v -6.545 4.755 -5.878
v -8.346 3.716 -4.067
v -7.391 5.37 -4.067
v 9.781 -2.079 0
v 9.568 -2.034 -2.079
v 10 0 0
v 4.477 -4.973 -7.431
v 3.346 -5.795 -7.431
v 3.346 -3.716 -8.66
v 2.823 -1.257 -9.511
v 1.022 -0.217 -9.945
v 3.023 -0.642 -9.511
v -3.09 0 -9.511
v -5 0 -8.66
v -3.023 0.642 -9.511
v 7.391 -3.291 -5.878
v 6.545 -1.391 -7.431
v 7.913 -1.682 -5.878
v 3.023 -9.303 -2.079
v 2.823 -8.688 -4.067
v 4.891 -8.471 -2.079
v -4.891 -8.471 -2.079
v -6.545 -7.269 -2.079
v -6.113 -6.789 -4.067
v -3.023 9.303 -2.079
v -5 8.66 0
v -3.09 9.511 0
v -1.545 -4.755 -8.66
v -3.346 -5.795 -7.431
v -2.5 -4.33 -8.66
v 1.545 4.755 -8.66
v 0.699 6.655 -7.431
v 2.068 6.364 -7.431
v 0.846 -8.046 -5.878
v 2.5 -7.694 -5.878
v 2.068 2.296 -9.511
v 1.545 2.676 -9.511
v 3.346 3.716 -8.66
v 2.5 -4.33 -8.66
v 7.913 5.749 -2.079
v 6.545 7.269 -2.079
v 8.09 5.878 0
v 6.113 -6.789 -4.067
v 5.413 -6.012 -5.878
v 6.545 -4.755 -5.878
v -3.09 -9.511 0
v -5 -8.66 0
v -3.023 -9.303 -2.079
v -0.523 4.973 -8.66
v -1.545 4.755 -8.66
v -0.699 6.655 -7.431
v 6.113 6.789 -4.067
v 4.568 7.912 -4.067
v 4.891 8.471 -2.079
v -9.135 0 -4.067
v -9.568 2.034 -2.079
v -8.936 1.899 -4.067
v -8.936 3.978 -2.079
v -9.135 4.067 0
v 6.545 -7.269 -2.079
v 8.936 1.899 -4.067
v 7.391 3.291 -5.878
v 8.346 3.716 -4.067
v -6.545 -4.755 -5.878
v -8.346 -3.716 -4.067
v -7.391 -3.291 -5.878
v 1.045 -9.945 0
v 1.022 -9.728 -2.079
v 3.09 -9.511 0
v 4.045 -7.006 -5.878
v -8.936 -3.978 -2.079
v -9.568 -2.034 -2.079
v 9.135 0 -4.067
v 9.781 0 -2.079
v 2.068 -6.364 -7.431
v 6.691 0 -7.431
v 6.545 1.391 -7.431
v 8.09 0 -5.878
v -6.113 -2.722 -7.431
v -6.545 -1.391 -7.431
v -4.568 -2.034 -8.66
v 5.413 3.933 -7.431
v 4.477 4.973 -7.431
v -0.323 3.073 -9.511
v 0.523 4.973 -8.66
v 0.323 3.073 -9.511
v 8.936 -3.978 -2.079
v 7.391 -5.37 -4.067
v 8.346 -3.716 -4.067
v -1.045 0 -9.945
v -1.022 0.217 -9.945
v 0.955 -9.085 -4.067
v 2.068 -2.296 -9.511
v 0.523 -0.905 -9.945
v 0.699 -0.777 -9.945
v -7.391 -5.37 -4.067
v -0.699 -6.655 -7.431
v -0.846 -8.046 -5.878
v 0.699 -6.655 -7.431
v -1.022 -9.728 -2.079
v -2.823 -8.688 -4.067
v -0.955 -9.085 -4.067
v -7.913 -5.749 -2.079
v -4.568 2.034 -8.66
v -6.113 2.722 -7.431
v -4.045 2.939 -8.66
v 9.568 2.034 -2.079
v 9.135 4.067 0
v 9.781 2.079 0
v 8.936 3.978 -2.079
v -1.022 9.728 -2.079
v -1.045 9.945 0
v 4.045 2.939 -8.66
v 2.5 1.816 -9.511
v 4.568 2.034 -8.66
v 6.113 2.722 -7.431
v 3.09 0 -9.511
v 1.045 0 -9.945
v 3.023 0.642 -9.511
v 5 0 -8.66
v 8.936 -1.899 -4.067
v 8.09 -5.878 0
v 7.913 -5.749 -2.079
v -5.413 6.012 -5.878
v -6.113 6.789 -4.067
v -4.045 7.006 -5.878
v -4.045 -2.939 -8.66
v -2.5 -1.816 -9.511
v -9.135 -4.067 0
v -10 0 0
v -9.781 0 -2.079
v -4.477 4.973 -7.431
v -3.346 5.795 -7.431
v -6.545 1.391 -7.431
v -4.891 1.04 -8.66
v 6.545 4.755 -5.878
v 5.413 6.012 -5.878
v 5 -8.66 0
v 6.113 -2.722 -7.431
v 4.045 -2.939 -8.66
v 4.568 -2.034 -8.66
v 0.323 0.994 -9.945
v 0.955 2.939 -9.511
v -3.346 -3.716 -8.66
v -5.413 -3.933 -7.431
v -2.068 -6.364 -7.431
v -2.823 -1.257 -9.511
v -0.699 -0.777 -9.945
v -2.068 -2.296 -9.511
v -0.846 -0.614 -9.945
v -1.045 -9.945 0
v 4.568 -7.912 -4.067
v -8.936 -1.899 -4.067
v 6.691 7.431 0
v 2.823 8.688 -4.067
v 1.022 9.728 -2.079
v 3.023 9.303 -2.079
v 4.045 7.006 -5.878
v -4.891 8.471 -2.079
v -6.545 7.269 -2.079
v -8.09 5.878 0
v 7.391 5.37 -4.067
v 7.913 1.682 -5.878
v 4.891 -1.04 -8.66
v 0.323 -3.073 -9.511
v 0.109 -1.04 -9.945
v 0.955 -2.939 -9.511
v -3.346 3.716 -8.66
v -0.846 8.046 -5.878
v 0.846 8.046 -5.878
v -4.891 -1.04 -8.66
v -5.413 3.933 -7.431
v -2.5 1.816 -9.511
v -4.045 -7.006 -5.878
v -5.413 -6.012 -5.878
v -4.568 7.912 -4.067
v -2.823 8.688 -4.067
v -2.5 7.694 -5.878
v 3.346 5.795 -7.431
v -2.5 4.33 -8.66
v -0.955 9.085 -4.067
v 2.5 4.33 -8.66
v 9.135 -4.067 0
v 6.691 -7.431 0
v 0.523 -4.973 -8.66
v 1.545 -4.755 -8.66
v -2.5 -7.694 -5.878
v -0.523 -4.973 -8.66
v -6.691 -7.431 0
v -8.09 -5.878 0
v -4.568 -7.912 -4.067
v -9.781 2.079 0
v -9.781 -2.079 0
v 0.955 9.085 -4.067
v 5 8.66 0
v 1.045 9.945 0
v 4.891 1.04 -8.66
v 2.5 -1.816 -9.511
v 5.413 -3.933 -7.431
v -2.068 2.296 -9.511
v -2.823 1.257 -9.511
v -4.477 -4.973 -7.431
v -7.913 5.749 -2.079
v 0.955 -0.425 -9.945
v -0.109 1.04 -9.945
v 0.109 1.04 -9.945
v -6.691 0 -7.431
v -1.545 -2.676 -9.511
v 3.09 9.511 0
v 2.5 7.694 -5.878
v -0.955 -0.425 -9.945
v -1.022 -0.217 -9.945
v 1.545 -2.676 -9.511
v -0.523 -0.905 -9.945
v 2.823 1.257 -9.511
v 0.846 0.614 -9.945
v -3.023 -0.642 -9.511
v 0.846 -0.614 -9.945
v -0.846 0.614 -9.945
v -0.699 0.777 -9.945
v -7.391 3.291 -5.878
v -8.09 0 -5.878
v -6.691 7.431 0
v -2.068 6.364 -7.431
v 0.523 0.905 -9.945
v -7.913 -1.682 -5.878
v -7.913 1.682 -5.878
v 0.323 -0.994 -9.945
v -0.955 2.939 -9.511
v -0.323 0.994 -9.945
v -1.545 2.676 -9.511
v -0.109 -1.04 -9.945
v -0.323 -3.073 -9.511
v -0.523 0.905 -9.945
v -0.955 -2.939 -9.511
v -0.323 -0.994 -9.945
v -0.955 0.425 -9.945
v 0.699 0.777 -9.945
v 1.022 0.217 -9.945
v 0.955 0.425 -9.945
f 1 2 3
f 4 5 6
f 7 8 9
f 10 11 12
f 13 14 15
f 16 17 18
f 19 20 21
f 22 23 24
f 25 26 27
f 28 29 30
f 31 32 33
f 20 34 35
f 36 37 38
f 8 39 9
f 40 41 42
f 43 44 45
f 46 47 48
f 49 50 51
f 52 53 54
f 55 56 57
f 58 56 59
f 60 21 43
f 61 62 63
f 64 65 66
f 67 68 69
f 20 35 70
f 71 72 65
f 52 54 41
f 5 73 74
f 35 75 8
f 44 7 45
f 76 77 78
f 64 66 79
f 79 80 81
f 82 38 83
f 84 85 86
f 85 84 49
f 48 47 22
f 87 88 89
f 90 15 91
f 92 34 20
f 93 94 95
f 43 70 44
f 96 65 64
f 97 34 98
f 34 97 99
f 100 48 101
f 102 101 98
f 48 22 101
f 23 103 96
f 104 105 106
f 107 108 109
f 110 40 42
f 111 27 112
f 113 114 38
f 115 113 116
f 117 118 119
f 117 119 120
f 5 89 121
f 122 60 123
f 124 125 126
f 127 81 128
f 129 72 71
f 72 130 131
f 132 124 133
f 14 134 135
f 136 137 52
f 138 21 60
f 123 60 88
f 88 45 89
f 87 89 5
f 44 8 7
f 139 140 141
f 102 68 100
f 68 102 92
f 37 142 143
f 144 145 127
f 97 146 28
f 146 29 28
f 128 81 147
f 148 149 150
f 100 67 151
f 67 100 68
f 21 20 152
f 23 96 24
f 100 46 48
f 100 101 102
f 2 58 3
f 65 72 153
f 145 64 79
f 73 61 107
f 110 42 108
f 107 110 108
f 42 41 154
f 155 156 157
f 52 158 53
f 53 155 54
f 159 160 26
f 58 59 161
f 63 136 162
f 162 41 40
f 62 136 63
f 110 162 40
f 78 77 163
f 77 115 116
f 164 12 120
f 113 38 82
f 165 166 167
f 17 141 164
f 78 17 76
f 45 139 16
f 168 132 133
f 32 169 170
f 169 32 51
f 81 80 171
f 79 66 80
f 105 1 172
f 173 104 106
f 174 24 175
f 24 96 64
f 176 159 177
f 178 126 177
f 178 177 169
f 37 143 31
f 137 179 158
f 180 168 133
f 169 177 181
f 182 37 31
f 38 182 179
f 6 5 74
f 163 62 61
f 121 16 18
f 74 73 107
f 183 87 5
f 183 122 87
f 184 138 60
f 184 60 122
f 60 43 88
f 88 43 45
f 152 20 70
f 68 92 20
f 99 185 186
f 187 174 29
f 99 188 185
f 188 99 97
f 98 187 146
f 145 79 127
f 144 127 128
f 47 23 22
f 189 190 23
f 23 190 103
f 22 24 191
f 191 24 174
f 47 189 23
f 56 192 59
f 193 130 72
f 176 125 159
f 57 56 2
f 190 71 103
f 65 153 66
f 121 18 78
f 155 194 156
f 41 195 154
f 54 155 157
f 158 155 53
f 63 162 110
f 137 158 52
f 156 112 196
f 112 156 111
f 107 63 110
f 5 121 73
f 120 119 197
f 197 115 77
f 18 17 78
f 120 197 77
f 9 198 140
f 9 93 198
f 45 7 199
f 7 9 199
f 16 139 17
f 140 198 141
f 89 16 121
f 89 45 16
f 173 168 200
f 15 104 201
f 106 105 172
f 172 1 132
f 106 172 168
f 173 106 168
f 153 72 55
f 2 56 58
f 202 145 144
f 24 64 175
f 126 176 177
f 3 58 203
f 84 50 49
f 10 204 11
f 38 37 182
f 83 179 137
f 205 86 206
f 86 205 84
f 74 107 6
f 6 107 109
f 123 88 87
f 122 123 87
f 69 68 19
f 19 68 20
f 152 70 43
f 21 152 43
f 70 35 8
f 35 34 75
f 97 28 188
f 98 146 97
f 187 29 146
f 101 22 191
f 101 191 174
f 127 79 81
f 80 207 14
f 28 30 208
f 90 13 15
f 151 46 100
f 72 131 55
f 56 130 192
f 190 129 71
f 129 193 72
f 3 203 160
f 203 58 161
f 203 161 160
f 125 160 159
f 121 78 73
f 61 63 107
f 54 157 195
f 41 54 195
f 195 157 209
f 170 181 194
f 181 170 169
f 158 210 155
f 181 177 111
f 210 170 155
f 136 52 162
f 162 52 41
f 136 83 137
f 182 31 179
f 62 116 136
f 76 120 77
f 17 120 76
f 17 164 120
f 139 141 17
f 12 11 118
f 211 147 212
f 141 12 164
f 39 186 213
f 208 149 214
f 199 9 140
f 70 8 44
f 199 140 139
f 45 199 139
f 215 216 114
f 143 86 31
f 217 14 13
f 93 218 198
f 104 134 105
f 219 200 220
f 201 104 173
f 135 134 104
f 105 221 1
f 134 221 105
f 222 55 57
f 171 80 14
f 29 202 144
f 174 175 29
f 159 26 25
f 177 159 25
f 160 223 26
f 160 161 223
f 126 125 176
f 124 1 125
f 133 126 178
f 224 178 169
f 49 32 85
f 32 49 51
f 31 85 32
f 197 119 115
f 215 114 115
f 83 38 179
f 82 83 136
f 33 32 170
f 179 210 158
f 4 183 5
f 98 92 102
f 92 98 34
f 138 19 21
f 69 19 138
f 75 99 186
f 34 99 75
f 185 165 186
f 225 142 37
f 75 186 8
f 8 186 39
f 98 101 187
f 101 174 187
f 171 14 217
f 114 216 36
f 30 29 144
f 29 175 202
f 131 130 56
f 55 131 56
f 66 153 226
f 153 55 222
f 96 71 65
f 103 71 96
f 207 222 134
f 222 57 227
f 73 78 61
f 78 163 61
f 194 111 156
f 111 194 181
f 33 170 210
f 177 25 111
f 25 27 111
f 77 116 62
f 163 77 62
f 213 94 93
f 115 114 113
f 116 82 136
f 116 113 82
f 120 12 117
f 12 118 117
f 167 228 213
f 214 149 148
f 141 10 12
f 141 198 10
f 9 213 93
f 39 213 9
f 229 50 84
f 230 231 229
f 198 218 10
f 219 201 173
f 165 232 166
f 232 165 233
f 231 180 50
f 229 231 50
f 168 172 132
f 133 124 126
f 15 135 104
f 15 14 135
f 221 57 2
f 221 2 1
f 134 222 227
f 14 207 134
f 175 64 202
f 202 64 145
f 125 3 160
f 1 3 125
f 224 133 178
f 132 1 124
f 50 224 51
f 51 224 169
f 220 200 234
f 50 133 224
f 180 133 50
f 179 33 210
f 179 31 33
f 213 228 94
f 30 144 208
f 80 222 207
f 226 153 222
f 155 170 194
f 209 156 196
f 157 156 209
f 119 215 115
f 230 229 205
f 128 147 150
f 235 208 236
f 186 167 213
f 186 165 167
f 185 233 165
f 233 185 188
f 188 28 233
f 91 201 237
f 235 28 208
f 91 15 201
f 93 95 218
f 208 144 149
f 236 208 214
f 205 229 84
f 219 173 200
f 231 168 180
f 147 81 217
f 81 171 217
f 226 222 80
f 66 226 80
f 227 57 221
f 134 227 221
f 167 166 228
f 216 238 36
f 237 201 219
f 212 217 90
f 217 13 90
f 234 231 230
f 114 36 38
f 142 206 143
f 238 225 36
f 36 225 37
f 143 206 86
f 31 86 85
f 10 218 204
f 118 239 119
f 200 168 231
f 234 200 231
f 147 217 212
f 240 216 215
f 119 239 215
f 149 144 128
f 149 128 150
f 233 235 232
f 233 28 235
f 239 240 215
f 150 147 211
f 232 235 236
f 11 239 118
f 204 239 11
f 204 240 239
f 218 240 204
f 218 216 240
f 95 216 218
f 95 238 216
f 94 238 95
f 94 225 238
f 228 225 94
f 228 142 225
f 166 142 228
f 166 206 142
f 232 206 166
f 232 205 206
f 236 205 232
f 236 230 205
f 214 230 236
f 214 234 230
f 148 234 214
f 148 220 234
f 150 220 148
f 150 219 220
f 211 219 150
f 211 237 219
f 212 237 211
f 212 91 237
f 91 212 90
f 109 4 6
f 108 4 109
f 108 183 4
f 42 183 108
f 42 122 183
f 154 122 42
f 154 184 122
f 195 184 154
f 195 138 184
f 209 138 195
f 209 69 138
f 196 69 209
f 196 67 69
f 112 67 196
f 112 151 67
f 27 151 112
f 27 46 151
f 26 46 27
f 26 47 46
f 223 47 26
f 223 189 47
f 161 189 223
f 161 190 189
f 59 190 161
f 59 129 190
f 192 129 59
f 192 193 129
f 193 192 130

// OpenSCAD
/*
Author: Chris Correll
Date: 11/3/2021
Description: Learn about parameterizing your code for easy modifications! Cut a sphere in half and then slice up some pizza. This lesson could be supported with a graph board and blocks of different sizes.
URL: https://github.com/funkonaut/openSCAD_lessons
*/

//Global Variables
$fn=30;

//Non parameterized code
difference(){
    sphere(10);
    translate([0,0,5])
#      cube([20,20,10],center=true);  //use the # to show the difference shape
}

/*
//Parameterized code
//Parameters
r_s=10;
difference(){
    sphere(r_s);
    translate([0,0,r_s/2])
      cube([r_s*2,r_s*2,r_s],center=true);
}
*/

/*
//Practice: Pizza slices
//Create a parameterized half pie pizza slice
//Hints: use a cylinder for your pizza
h=1;
r=10;    
difference(){
    cylinder(h=h,r=r,center=true);
    translate([0,r/2,0])
      cube([r*2,r,h],center=true);
}
*/

/*
//Create a paramterized quarter pizza slice anywhere
h=1;
r=10;    
difference(){
    cylinder(h=h,r=r,center=true);
    translate([0,r/2,0])
      cube([r*2,r,h],center=true);
    translate([r/2,0,0])
      cube([r,r*2,h],center=true);
}
*/

/*
//BONUS or Homework: Create a parameterized quarter pizza slice in the adjacent quadrant from the previous quarter slice.
h=1;
r=10;    
difference(){
    cylinder(h=h,r=r,center=true);
    translate([0,-r/2,0])
      cube([r*2,r,h],center=true);
    translate([-r/2,0,0])
      cube([r,r*2,h],center=true);
}
*/
